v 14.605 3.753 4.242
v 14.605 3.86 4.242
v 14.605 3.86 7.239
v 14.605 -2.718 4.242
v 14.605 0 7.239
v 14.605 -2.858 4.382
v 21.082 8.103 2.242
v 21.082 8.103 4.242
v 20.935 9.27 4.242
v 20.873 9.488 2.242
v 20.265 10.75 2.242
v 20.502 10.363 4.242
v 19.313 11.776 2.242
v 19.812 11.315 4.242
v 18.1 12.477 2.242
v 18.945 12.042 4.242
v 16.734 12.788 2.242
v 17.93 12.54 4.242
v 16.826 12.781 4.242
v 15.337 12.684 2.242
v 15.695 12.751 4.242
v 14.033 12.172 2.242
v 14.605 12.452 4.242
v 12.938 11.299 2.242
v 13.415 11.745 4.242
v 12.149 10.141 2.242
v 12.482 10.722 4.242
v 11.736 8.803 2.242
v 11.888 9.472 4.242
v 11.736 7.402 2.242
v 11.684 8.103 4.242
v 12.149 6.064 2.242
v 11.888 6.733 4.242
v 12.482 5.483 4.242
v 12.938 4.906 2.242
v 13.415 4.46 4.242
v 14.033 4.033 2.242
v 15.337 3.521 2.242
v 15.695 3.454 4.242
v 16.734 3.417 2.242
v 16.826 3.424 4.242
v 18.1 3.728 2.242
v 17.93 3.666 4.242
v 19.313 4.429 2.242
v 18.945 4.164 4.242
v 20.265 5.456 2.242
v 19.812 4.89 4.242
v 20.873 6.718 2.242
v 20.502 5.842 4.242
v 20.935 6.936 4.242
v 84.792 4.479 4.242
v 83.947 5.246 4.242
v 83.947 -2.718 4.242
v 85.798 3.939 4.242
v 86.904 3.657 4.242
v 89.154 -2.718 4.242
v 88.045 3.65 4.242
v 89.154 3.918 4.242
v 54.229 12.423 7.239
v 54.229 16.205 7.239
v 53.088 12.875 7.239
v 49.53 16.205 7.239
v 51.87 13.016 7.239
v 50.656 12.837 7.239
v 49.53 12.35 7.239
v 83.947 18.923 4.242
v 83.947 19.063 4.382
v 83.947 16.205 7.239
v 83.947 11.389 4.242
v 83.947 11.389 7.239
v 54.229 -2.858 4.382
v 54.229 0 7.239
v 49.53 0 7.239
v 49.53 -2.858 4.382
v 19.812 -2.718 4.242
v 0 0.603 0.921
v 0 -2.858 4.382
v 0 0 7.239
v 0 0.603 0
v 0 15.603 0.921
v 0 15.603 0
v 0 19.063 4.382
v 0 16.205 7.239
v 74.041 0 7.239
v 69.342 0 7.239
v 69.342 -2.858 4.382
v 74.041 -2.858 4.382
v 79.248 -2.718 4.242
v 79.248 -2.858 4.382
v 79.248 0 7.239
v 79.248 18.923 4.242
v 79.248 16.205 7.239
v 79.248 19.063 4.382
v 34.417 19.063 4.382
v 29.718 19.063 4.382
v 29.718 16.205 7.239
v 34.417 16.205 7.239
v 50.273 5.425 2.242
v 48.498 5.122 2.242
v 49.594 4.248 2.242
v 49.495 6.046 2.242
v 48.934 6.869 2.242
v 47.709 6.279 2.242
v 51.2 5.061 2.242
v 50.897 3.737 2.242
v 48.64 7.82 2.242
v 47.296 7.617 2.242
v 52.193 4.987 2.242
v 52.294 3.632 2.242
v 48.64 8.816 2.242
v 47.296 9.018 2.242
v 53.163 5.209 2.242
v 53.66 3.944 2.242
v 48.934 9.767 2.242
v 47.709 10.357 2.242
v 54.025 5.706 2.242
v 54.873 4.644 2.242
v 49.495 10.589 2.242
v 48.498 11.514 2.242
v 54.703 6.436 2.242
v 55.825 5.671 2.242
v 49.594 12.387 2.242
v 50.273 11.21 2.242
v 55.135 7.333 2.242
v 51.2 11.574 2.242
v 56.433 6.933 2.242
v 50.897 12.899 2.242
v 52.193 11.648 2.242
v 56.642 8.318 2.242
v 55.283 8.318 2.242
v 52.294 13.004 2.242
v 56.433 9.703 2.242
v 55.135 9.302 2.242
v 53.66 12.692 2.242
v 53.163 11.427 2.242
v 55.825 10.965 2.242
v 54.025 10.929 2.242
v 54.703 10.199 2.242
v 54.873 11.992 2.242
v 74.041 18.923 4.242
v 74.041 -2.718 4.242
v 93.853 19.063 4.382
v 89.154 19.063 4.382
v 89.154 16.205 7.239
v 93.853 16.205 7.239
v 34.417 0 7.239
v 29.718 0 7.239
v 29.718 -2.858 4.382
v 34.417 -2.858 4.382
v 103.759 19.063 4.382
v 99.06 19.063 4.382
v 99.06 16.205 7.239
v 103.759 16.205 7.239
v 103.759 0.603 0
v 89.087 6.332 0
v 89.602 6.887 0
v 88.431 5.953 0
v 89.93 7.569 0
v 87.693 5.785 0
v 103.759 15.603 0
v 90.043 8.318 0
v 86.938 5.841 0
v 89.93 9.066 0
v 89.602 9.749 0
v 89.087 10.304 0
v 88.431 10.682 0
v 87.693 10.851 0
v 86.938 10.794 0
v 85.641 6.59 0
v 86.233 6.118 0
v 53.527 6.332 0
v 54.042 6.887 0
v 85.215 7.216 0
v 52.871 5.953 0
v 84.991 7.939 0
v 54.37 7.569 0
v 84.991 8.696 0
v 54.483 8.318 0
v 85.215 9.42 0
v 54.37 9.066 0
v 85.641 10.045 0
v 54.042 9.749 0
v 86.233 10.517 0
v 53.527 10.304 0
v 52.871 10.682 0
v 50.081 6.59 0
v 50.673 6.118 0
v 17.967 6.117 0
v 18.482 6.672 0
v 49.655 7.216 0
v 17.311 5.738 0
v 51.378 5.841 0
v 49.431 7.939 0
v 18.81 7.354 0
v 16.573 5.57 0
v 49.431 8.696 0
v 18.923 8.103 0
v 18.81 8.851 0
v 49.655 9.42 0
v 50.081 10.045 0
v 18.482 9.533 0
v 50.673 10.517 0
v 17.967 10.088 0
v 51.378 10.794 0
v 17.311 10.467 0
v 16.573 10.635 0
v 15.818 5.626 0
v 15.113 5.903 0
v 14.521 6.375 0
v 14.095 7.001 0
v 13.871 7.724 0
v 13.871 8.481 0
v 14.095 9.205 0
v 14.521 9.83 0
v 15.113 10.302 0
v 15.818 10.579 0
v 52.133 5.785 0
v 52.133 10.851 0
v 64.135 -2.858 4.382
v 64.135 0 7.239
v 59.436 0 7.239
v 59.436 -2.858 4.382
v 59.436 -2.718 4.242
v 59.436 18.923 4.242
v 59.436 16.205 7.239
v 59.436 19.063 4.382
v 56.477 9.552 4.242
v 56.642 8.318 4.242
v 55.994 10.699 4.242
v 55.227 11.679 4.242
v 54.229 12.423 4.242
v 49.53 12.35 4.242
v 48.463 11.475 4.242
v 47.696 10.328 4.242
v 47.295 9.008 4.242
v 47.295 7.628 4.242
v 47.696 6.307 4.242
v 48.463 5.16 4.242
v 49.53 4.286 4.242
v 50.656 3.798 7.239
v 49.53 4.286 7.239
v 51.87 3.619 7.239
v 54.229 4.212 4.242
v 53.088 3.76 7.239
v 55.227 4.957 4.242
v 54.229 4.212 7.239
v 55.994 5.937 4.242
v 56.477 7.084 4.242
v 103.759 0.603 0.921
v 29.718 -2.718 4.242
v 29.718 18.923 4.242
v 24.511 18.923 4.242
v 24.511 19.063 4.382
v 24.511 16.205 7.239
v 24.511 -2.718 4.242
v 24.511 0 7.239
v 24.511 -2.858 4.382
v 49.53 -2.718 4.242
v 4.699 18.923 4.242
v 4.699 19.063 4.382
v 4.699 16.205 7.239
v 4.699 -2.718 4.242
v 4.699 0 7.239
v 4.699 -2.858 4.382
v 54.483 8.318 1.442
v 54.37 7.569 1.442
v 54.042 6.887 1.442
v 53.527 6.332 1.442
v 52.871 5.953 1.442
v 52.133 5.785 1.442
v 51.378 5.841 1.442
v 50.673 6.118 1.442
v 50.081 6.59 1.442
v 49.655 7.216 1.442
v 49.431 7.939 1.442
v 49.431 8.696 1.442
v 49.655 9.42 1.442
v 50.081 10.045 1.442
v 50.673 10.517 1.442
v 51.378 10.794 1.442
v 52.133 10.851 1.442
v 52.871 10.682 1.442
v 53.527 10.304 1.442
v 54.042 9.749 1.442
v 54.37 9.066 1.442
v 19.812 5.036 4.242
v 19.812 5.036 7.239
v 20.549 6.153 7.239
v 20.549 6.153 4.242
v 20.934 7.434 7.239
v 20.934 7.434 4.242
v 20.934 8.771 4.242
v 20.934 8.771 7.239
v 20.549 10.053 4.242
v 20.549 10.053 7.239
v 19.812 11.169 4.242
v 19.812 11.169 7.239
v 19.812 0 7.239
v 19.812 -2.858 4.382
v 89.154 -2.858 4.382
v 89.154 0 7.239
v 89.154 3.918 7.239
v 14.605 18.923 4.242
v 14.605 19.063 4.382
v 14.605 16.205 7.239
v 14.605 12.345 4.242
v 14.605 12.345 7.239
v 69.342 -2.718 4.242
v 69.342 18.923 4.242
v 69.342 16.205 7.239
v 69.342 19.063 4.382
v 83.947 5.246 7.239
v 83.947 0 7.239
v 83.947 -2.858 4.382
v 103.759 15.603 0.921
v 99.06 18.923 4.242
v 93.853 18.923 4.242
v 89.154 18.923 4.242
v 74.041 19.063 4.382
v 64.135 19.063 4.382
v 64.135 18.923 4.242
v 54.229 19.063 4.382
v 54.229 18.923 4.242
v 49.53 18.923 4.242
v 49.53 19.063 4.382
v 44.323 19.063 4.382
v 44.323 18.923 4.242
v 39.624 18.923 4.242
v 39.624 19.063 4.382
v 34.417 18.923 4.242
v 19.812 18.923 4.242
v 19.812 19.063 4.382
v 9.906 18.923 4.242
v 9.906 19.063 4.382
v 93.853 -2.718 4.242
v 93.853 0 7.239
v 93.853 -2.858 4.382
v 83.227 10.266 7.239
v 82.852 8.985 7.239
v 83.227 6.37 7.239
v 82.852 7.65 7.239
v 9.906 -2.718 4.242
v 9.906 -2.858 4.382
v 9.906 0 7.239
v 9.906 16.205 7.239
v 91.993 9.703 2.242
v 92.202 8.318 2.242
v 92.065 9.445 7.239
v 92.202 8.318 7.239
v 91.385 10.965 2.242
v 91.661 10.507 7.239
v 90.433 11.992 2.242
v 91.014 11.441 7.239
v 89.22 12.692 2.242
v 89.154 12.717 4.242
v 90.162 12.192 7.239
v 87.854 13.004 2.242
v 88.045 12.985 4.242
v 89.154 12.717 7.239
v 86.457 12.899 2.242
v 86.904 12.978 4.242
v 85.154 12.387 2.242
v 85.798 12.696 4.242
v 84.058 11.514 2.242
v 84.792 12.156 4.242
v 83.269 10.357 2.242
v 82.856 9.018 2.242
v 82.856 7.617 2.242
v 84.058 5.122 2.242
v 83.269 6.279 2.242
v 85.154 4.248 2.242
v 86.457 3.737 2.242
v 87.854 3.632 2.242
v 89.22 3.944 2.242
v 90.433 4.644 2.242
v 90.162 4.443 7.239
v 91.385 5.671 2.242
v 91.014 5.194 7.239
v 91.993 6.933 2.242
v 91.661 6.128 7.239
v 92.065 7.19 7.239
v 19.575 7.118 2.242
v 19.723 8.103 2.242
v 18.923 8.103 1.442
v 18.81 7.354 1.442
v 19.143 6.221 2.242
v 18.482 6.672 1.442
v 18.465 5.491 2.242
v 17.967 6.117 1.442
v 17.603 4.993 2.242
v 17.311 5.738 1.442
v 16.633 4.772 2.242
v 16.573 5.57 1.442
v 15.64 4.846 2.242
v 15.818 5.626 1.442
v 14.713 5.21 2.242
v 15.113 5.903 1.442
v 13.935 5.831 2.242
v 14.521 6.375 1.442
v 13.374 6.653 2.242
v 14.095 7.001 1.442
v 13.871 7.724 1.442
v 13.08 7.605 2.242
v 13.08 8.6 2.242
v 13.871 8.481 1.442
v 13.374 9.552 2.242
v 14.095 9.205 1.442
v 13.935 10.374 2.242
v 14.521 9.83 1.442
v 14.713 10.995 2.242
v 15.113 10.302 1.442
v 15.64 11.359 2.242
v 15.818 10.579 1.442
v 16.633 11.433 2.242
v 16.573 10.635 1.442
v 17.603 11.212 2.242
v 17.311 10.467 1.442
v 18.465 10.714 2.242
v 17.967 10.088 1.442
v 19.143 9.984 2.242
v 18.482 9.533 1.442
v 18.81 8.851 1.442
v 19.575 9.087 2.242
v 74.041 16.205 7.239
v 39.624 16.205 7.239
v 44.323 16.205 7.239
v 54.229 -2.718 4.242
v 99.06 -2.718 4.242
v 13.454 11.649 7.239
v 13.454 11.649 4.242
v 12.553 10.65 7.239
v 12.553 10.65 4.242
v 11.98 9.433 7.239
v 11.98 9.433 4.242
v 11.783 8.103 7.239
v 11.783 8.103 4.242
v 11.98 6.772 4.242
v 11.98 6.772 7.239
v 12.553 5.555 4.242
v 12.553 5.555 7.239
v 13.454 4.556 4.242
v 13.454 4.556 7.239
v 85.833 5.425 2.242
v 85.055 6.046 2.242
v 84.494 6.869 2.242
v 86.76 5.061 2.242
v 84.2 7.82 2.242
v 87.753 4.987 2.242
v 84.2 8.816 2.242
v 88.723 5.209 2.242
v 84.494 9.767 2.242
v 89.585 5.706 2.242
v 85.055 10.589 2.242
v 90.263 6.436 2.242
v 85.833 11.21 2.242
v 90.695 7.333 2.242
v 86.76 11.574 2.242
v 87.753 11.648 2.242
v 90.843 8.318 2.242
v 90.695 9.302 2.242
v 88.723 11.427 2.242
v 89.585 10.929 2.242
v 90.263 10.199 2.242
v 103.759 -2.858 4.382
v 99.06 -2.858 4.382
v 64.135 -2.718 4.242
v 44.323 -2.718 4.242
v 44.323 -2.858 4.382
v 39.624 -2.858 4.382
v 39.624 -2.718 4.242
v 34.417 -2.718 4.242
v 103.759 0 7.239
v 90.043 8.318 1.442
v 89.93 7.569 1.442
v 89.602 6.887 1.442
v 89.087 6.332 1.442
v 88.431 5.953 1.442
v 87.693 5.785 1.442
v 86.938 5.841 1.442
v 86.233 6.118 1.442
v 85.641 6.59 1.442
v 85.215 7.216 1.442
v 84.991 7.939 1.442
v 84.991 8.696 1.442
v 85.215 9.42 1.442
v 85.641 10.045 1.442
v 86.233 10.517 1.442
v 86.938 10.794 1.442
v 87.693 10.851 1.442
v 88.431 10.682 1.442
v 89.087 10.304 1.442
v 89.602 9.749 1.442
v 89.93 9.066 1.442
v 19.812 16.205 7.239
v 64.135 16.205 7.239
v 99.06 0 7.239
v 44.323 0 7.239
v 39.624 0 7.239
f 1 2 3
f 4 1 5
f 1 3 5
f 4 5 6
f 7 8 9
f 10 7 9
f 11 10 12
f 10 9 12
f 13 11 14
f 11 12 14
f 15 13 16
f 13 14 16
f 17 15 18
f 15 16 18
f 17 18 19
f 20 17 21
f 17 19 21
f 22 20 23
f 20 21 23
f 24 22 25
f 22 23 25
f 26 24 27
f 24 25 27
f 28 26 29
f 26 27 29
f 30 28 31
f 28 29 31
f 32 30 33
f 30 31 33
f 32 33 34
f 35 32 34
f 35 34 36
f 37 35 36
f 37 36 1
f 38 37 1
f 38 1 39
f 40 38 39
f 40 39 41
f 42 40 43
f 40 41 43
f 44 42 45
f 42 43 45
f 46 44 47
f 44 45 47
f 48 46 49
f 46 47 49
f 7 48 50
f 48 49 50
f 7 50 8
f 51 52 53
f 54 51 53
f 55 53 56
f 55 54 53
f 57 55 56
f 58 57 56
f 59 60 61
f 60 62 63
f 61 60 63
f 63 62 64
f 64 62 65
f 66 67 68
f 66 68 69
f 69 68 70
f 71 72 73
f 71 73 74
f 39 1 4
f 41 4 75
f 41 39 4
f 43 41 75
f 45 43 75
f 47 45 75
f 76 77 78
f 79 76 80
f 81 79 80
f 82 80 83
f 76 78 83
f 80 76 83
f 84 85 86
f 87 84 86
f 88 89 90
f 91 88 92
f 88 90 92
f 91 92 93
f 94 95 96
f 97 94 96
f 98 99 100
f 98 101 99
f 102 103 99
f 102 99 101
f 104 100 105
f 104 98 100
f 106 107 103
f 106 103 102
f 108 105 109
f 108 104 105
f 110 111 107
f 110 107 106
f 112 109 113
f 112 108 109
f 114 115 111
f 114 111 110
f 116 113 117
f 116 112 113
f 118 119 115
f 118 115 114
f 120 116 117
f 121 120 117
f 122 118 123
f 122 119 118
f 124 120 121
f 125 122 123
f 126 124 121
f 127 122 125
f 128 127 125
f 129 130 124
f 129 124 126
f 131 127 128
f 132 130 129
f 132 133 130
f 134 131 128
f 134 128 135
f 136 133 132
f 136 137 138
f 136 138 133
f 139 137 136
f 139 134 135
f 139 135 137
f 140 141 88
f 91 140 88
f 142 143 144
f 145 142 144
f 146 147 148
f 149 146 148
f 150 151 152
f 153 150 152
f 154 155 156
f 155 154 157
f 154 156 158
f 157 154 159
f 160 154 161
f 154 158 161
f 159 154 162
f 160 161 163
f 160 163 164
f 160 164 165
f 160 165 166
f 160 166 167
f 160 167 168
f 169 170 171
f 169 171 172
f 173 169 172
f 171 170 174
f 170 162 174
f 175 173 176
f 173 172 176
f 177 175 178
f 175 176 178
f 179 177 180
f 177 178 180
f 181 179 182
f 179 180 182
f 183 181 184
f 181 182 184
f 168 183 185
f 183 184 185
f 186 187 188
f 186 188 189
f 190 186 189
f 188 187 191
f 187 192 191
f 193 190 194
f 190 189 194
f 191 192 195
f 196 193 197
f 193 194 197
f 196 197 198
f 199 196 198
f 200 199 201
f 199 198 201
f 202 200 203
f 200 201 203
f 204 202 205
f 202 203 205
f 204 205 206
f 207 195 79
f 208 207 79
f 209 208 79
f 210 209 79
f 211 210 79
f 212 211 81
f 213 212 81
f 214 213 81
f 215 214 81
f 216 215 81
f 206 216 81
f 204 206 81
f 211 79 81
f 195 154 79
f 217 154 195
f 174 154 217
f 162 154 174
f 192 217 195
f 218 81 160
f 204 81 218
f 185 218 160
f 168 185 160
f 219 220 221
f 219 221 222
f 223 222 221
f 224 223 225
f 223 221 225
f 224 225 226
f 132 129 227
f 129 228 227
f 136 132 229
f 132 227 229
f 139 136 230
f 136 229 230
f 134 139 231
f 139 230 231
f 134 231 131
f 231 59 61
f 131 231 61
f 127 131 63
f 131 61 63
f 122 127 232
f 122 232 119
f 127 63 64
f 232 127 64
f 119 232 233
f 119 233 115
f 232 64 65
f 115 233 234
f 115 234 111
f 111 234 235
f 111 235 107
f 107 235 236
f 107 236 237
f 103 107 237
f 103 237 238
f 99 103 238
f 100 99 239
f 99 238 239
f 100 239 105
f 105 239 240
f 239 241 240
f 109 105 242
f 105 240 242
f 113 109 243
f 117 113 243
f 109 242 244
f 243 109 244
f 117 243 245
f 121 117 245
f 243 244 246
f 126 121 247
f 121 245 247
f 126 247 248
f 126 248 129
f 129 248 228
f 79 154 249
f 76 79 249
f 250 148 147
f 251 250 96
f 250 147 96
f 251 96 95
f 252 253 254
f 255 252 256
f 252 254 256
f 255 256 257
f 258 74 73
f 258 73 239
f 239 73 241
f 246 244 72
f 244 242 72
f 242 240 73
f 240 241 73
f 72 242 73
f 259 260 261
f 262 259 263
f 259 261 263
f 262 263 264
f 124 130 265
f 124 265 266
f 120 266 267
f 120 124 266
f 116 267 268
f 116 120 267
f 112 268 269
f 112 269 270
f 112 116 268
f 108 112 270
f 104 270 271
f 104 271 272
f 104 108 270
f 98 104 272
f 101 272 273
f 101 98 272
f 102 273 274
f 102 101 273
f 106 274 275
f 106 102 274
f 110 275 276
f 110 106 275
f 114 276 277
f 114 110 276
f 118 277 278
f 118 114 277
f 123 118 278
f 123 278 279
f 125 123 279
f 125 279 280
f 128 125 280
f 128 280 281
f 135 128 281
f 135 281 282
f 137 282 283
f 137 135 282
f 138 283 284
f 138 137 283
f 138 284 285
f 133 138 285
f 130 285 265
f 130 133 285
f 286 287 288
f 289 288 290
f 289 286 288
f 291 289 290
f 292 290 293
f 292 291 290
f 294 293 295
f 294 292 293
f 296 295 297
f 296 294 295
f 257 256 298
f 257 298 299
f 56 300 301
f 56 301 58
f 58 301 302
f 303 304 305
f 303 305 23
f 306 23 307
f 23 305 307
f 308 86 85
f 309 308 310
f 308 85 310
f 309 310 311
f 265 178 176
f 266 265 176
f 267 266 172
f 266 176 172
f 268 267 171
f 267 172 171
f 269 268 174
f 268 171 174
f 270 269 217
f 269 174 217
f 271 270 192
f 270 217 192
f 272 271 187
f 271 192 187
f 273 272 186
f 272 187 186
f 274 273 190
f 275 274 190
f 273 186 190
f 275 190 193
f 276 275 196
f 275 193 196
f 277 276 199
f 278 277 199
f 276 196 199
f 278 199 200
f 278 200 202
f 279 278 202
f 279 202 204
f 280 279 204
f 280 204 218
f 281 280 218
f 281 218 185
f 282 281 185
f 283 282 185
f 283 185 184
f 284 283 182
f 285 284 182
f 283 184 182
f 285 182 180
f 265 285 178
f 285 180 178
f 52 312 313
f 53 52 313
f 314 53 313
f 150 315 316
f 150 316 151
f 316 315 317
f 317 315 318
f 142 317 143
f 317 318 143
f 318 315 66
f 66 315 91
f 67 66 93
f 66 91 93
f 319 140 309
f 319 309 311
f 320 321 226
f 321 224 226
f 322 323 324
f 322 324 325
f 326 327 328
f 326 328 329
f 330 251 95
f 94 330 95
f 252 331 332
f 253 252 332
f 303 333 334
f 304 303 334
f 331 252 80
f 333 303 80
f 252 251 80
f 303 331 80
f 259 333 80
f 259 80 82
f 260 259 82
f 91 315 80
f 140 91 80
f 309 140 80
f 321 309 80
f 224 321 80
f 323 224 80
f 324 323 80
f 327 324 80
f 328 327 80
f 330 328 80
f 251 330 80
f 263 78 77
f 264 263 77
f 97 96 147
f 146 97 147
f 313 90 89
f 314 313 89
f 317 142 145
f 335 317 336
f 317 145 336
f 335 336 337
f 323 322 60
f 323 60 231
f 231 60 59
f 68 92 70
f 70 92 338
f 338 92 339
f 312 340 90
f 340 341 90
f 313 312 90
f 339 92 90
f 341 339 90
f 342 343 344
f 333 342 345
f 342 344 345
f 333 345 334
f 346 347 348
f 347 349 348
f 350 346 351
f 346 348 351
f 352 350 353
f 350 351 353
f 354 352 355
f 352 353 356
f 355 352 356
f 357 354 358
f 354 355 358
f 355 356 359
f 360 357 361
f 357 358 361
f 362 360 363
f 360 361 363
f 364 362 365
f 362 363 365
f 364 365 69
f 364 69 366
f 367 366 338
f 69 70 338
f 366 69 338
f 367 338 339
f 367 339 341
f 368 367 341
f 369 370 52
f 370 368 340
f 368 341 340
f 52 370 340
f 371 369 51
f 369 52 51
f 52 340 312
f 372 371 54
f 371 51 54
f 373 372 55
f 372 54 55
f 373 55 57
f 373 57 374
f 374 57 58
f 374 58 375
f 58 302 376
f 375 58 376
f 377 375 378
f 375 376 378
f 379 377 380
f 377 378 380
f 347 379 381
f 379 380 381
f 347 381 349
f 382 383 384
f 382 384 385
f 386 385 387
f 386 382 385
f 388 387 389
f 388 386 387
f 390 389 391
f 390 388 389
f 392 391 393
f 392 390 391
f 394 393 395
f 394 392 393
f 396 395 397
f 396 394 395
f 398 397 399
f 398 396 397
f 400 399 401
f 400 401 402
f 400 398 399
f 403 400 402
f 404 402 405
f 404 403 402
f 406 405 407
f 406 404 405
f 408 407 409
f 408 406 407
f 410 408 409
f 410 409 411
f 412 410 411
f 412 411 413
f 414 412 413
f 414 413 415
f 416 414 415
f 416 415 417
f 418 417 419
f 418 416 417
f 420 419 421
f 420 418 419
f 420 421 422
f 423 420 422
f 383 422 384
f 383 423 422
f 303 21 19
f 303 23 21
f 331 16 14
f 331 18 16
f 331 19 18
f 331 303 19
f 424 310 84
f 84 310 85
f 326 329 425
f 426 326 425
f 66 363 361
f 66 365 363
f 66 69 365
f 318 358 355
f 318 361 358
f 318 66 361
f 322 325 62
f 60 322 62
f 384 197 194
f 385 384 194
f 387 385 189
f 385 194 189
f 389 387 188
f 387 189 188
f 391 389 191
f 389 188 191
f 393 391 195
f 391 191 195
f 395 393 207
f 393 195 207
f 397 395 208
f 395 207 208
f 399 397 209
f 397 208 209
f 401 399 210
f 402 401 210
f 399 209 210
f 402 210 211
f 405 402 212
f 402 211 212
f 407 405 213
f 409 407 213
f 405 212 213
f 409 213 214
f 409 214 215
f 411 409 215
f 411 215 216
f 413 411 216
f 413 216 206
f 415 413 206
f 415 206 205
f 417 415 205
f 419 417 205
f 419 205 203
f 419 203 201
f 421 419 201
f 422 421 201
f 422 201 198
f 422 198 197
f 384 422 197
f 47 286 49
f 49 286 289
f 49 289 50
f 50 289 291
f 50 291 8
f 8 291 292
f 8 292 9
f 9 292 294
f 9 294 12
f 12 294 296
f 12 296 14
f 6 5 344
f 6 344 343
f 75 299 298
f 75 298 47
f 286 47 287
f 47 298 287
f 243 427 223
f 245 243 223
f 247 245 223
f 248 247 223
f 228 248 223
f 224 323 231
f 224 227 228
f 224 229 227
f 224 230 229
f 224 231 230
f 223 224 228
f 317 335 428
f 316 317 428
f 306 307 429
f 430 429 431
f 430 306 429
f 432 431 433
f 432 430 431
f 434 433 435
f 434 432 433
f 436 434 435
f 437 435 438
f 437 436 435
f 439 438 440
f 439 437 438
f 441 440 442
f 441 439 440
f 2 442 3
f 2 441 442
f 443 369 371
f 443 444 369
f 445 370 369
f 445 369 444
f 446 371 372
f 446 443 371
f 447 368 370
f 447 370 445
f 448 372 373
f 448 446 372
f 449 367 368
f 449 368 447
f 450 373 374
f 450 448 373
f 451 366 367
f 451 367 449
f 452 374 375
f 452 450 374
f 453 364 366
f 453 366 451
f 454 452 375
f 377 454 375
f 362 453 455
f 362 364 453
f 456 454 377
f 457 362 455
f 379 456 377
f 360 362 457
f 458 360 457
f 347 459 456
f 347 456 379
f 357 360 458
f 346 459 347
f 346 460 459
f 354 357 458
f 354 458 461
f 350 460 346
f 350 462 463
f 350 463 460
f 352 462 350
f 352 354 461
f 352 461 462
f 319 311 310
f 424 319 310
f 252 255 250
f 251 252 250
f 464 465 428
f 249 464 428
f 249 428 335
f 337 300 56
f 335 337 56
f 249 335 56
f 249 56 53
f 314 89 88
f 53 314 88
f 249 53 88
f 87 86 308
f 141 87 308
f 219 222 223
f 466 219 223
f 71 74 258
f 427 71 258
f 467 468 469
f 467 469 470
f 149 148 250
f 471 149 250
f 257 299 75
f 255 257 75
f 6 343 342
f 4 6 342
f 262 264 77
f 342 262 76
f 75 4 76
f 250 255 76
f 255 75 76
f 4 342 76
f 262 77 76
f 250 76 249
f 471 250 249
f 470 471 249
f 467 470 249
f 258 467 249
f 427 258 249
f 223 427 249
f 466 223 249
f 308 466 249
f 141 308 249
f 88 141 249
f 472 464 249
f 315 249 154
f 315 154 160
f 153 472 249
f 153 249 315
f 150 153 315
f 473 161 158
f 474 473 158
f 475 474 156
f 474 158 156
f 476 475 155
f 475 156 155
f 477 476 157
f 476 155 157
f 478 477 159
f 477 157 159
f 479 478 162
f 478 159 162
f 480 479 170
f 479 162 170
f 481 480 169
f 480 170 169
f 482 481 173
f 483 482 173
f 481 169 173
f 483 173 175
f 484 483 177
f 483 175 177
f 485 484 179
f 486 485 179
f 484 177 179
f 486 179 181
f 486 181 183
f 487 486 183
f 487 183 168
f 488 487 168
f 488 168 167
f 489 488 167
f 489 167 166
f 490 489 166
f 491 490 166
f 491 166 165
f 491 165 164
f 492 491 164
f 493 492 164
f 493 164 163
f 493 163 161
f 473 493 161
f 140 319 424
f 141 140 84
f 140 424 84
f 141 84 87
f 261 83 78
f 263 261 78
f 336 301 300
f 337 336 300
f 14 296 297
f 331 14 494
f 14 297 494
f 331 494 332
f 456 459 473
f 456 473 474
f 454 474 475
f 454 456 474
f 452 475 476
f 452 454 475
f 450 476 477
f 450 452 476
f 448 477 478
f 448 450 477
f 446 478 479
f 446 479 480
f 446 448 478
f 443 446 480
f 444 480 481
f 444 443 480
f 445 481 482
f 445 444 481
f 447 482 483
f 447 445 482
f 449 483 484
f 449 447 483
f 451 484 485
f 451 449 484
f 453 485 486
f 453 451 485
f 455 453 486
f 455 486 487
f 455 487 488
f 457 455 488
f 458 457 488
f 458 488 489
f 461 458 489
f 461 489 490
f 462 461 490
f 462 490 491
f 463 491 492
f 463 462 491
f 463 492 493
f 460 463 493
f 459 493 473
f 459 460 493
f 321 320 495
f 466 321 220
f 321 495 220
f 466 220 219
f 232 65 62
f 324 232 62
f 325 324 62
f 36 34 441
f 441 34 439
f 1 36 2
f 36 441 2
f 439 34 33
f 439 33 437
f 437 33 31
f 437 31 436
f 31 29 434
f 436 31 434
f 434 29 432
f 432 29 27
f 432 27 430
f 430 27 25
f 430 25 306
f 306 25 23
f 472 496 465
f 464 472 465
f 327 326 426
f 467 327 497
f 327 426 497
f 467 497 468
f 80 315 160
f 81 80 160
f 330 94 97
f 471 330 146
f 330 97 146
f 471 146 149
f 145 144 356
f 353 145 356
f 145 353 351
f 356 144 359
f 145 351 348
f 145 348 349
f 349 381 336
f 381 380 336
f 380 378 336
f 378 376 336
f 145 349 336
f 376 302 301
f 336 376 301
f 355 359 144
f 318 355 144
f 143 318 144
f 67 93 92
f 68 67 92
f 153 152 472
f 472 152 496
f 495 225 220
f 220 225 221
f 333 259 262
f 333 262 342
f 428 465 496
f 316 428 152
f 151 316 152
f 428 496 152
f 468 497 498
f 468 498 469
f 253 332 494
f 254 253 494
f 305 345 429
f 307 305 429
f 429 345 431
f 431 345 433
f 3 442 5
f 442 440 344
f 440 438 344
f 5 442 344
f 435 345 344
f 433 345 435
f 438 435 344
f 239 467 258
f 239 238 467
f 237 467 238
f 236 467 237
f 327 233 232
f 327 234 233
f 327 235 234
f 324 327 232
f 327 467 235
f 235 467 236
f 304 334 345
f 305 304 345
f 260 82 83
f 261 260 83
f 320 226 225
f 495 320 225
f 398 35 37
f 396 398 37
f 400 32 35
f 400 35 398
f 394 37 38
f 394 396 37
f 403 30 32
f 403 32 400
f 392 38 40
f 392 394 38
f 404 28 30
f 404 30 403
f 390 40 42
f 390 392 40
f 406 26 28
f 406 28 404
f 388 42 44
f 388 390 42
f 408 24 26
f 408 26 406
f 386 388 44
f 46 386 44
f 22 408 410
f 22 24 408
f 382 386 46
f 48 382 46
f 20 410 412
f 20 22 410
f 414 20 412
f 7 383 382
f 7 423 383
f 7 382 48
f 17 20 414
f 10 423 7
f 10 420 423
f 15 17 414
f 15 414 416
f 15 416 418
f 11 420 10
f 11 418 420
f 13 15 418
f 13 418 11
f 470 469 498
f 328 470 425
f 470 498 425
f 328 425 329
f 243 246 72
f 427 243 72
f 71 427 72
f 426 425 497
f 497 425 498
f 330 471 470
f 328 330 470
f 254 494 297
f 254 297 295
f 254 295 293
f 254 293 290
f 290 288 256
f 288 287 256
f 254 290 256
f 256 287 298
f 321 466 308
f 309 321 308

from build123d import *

# Parameters (mm, degrees)
F1_DEPTH  = 103.759
F2_W      = 5.207
F2_H      = 2.8575
F2_H_2    = 16.2052
F2_H_3    = 2.9408035447
F3_DEPTH  = 2.9972
F4_R      = 2.54
F5_DEPTH  = 12.7
F6_R      = 4.6
F7_DEPTH  = 25.4
F8_R      = 4.6
F9_DEPTH  = 25.4
F10_R     = 4.6
F11_DEPTH = 25.4
F13_DEPTH = 127
F14_R     = 4.699
F15_DEPTH = 2
F16_R     = 4.699
F17_DEPTH = 2
F18_DEPTH = 25.4
F19_R     = 4.699
F20_DEPTH = 2
F21_DEPTH = 25.4
F22_SIZE  = 0.8


with BuildPart() as f1:
    # F0 (on Right) → F1 (new body)
    with BuildSketch(Plane.YZ):
        Polygon((0, 1.524), (0, 0), (16.2052, 0), (16.2052, 1.524), (19.0627, 4.3815), (16.2052, 7.239), (0, 7.239), (-2.8575, 4.3815), align=None)
    extrude(amount=F1_DEPTH)

    # F2 (on face) → F3 (cut)
    with BuildSketch(Plane.XY.offset(7.239)):
        with Locations((7.3025, -1.42875)):
            Rectangle(F2_W, F2_H)
        Polygon((4.699, 16.2052), (4.699, 8.1026), (4.699, 0), (9.906, 0), (9.906, 16.2052), align=None)
        with Locations((7.3025, 17.63395)):
            Rectangle(F2_W, F2_H)
        with Locations((17.2085, 17.63395)):
            Rectangle(F2_W, F2_H)
        with Locations((17.2085, 8.1026)):
            Rectangle(F2_W, F2_H_2)
        with Locations((17.2085, -1.42875)):
            Rectangle(F2_W, F2_H)
        with Locations((27.1145, 17.63395)):
            Rectangle(F2_W, F2_H)
        with Locations((27.1145, 8.1026)):
            Rectangle(F2_W, F2_H_2)
        with Locations((27.1145, -1.42875)):
            Rectangle(F2_W, F2_H)
        with Locations((37.0205, 17.63395)):
            Rectangle(F2_W, F2_H)
        with Locations((37.0205, 8.1026)):
            Rectangle(F2_W, F2_H_2)
        with Locations((37.0205, -1.42875)):
            Rectangle(F2_W, F2_H)
        with Locations((46.9265, 17.63395)):
            Rectangle(F2_W, F2_H)
        with Locations((46.9265, 8.1026)):
            Rectangle(F2_W, F2_H_2)
        with Locations((46.9265, -1.42875)):
            Rectangle(F2_W, F2_H)
        with Locations((56.8325, 17.63395)):
            Rectangle(F2_W, F2_H)
        with Locations((56.8325, 8.1026)):
            Rectangle(F2_W, F2_H_2)
        with Locations((56.8325, -1.42875)):
            Rectangle(F2_W, F2_H)
        with Locations((66.7385, 17.63395)):
            Rectangle(F2_W, F2_H)
        with Locations((66.7385, 8.1026)):
            Rectangle(F2_W, F2_H_2)
        with Locations((66.7385, -1.42875)):
            Rectangle(F2_W, F2_H)
        with Locations((76.6445, 17.63395)):
            Rectangle(F2_W, F2_H)
        with Locations((76.6445, 8.1026)):
            Rectangle(F2_W, F2_H_2)
        with Locations((76.6445, -1.42875)):
            Rectangle(F2_W, F2_H)
        with Locations((86.5505, -1.42875)):
            Rectangle(F2_W, F2_H)
        with Locations((86.5505, 8.1026)):
            Rectangle(F2_W, F2_H_2)
        with Locations((86.5505, 17.63395)):
            Rectangle(F2_W, F2_H)
        with Locations((96.4565, 17.6756017723)):
            Rectangle(F2_W, F2_H_3)
        with Locations((96.4565, 8.1026)):
            Rectangle(F2_W, F2_H_2)
        with Locations((96.4565, -1.4704017723)):
            Rectangle(F2_W, F2_H_3)
    extrude(amount=-F3_DEPTH, mode=Mode.SUBTRACT)

    # F4 (on face) → F5 (cut, symmetric)
    with BuildSketch(Plane(origin=(0, 0, 0), x_dir=(1, 0, 0), z_dir=(0, 0, -1))):
        with Locations((87.503, -8.3177030837)):
            Circle(F4_R)
        with Locations((16.383, -8.1026)):
            Circle(F4_R)
        with Locations((51.943, -8.3177030837)):
            Circle(F4_R)
    extrude(amount=F5_DEPTH, both=True, mode=Mode.SUBTRACT)

    # F6 (on face) → F7 (cut)
    with BuildSketch(Plane.XY.offset(4.2418)):
        with Locations((16.383, 8.1026)):
            Circle(F6_R)
    extrude(amount=F7_DEPTH, mode=Mode.SUBTRACT)

    # F8 (on face) → F9 (cut)
    with BuildSketch(Plane.XY.offset(4.2418)):
        with Locations((87.503, 8.3177030837)):
            Circle(F8_R)
    extrude(amount=F9_DEPTH, mode=Mode.SUBTRACT)

    # F10 (on face) → F11 (cut)
    with BuildSketch(Plane.XY.offset(4.2418)):
        with Locations((51.943, 8.3177030837)):
            Circle(F10_R)
    extrude(amount=F11_DEPTH, mode=Mode.SUBTRACT)

    # F12 (on face) → F13 (cut)
    with BuildSketch(Plane.YZ.offset(103.759)):
        Polygon((0.6026, 0.9214), (-2.8575, 4.3815), (-2.8575, 0), (0.6026, 0), align=None)
        Polygon((19.0627, 0), (19.0627, 4.3815), (15.6026, 0.9214), (15.6026, 0), align=None)
    extrude(amount=-F13_DEPTH, mode=Mode.SUBTRACT)

    # F14 (on face) → F15 (cut)
    with BuildSketch(Plane.XY.offset(4.2418)):
        with Locations((16.383, 8.1026)):
            Circle(F14_R)
    extrude(amount=-F15_DEPTH, mode=Mode.SUBTRACT)

    # F16 (on face) → F17 (cut)
    with BuildSketch(Plane.XY.offset(4.2418)):
        with Locations((51.943, 8.3177030837)):
            Circle(F16_R)
    extrude(amount=-F17_DEPTH, mode=Mode.SUBTRACT)

    # F16 (on face) → F18 (cut)
    with BuildSketch(Plane.XY.offset(4.2418)):
        with Locations((51.943, 8.3177030837)):
            Circle(F16_R)
    extrude(amount=F18_DEPTH, mode=Mode.SUBTRACT)

    # F19 (on face) → F20 (cut)
    with BuildSketch(Plane.XY.offset(4.2418)):
        with Locations((87.503, 8.3177030837)):
            Circle(F19_R)
    extrude(amount=-F20_DEPTH, mode=Mode.SUBTRACT)

    # F19 (on face) → F21 (cut)
    with BuildSketch(Plane.XY.offset(4.2418)):
        with Locations((87.503, 8.3177030837)):
            Circle(F19_R)
    extrude(amount=F21_DEPTH, mode=Mode.SUBTRACT)

    # F22
    f22_edges = [f1.edges().sort_by_distance(p)[0] for p in [
        (84.963, 8.317703, 2.2418),
        (49.403, 8.317703, 2.2418),
        (13.843, 8.1026, 2.2418),
    ]]
    chamfer(f22_edges, length=F22_SIZE)


solid = f1.part
